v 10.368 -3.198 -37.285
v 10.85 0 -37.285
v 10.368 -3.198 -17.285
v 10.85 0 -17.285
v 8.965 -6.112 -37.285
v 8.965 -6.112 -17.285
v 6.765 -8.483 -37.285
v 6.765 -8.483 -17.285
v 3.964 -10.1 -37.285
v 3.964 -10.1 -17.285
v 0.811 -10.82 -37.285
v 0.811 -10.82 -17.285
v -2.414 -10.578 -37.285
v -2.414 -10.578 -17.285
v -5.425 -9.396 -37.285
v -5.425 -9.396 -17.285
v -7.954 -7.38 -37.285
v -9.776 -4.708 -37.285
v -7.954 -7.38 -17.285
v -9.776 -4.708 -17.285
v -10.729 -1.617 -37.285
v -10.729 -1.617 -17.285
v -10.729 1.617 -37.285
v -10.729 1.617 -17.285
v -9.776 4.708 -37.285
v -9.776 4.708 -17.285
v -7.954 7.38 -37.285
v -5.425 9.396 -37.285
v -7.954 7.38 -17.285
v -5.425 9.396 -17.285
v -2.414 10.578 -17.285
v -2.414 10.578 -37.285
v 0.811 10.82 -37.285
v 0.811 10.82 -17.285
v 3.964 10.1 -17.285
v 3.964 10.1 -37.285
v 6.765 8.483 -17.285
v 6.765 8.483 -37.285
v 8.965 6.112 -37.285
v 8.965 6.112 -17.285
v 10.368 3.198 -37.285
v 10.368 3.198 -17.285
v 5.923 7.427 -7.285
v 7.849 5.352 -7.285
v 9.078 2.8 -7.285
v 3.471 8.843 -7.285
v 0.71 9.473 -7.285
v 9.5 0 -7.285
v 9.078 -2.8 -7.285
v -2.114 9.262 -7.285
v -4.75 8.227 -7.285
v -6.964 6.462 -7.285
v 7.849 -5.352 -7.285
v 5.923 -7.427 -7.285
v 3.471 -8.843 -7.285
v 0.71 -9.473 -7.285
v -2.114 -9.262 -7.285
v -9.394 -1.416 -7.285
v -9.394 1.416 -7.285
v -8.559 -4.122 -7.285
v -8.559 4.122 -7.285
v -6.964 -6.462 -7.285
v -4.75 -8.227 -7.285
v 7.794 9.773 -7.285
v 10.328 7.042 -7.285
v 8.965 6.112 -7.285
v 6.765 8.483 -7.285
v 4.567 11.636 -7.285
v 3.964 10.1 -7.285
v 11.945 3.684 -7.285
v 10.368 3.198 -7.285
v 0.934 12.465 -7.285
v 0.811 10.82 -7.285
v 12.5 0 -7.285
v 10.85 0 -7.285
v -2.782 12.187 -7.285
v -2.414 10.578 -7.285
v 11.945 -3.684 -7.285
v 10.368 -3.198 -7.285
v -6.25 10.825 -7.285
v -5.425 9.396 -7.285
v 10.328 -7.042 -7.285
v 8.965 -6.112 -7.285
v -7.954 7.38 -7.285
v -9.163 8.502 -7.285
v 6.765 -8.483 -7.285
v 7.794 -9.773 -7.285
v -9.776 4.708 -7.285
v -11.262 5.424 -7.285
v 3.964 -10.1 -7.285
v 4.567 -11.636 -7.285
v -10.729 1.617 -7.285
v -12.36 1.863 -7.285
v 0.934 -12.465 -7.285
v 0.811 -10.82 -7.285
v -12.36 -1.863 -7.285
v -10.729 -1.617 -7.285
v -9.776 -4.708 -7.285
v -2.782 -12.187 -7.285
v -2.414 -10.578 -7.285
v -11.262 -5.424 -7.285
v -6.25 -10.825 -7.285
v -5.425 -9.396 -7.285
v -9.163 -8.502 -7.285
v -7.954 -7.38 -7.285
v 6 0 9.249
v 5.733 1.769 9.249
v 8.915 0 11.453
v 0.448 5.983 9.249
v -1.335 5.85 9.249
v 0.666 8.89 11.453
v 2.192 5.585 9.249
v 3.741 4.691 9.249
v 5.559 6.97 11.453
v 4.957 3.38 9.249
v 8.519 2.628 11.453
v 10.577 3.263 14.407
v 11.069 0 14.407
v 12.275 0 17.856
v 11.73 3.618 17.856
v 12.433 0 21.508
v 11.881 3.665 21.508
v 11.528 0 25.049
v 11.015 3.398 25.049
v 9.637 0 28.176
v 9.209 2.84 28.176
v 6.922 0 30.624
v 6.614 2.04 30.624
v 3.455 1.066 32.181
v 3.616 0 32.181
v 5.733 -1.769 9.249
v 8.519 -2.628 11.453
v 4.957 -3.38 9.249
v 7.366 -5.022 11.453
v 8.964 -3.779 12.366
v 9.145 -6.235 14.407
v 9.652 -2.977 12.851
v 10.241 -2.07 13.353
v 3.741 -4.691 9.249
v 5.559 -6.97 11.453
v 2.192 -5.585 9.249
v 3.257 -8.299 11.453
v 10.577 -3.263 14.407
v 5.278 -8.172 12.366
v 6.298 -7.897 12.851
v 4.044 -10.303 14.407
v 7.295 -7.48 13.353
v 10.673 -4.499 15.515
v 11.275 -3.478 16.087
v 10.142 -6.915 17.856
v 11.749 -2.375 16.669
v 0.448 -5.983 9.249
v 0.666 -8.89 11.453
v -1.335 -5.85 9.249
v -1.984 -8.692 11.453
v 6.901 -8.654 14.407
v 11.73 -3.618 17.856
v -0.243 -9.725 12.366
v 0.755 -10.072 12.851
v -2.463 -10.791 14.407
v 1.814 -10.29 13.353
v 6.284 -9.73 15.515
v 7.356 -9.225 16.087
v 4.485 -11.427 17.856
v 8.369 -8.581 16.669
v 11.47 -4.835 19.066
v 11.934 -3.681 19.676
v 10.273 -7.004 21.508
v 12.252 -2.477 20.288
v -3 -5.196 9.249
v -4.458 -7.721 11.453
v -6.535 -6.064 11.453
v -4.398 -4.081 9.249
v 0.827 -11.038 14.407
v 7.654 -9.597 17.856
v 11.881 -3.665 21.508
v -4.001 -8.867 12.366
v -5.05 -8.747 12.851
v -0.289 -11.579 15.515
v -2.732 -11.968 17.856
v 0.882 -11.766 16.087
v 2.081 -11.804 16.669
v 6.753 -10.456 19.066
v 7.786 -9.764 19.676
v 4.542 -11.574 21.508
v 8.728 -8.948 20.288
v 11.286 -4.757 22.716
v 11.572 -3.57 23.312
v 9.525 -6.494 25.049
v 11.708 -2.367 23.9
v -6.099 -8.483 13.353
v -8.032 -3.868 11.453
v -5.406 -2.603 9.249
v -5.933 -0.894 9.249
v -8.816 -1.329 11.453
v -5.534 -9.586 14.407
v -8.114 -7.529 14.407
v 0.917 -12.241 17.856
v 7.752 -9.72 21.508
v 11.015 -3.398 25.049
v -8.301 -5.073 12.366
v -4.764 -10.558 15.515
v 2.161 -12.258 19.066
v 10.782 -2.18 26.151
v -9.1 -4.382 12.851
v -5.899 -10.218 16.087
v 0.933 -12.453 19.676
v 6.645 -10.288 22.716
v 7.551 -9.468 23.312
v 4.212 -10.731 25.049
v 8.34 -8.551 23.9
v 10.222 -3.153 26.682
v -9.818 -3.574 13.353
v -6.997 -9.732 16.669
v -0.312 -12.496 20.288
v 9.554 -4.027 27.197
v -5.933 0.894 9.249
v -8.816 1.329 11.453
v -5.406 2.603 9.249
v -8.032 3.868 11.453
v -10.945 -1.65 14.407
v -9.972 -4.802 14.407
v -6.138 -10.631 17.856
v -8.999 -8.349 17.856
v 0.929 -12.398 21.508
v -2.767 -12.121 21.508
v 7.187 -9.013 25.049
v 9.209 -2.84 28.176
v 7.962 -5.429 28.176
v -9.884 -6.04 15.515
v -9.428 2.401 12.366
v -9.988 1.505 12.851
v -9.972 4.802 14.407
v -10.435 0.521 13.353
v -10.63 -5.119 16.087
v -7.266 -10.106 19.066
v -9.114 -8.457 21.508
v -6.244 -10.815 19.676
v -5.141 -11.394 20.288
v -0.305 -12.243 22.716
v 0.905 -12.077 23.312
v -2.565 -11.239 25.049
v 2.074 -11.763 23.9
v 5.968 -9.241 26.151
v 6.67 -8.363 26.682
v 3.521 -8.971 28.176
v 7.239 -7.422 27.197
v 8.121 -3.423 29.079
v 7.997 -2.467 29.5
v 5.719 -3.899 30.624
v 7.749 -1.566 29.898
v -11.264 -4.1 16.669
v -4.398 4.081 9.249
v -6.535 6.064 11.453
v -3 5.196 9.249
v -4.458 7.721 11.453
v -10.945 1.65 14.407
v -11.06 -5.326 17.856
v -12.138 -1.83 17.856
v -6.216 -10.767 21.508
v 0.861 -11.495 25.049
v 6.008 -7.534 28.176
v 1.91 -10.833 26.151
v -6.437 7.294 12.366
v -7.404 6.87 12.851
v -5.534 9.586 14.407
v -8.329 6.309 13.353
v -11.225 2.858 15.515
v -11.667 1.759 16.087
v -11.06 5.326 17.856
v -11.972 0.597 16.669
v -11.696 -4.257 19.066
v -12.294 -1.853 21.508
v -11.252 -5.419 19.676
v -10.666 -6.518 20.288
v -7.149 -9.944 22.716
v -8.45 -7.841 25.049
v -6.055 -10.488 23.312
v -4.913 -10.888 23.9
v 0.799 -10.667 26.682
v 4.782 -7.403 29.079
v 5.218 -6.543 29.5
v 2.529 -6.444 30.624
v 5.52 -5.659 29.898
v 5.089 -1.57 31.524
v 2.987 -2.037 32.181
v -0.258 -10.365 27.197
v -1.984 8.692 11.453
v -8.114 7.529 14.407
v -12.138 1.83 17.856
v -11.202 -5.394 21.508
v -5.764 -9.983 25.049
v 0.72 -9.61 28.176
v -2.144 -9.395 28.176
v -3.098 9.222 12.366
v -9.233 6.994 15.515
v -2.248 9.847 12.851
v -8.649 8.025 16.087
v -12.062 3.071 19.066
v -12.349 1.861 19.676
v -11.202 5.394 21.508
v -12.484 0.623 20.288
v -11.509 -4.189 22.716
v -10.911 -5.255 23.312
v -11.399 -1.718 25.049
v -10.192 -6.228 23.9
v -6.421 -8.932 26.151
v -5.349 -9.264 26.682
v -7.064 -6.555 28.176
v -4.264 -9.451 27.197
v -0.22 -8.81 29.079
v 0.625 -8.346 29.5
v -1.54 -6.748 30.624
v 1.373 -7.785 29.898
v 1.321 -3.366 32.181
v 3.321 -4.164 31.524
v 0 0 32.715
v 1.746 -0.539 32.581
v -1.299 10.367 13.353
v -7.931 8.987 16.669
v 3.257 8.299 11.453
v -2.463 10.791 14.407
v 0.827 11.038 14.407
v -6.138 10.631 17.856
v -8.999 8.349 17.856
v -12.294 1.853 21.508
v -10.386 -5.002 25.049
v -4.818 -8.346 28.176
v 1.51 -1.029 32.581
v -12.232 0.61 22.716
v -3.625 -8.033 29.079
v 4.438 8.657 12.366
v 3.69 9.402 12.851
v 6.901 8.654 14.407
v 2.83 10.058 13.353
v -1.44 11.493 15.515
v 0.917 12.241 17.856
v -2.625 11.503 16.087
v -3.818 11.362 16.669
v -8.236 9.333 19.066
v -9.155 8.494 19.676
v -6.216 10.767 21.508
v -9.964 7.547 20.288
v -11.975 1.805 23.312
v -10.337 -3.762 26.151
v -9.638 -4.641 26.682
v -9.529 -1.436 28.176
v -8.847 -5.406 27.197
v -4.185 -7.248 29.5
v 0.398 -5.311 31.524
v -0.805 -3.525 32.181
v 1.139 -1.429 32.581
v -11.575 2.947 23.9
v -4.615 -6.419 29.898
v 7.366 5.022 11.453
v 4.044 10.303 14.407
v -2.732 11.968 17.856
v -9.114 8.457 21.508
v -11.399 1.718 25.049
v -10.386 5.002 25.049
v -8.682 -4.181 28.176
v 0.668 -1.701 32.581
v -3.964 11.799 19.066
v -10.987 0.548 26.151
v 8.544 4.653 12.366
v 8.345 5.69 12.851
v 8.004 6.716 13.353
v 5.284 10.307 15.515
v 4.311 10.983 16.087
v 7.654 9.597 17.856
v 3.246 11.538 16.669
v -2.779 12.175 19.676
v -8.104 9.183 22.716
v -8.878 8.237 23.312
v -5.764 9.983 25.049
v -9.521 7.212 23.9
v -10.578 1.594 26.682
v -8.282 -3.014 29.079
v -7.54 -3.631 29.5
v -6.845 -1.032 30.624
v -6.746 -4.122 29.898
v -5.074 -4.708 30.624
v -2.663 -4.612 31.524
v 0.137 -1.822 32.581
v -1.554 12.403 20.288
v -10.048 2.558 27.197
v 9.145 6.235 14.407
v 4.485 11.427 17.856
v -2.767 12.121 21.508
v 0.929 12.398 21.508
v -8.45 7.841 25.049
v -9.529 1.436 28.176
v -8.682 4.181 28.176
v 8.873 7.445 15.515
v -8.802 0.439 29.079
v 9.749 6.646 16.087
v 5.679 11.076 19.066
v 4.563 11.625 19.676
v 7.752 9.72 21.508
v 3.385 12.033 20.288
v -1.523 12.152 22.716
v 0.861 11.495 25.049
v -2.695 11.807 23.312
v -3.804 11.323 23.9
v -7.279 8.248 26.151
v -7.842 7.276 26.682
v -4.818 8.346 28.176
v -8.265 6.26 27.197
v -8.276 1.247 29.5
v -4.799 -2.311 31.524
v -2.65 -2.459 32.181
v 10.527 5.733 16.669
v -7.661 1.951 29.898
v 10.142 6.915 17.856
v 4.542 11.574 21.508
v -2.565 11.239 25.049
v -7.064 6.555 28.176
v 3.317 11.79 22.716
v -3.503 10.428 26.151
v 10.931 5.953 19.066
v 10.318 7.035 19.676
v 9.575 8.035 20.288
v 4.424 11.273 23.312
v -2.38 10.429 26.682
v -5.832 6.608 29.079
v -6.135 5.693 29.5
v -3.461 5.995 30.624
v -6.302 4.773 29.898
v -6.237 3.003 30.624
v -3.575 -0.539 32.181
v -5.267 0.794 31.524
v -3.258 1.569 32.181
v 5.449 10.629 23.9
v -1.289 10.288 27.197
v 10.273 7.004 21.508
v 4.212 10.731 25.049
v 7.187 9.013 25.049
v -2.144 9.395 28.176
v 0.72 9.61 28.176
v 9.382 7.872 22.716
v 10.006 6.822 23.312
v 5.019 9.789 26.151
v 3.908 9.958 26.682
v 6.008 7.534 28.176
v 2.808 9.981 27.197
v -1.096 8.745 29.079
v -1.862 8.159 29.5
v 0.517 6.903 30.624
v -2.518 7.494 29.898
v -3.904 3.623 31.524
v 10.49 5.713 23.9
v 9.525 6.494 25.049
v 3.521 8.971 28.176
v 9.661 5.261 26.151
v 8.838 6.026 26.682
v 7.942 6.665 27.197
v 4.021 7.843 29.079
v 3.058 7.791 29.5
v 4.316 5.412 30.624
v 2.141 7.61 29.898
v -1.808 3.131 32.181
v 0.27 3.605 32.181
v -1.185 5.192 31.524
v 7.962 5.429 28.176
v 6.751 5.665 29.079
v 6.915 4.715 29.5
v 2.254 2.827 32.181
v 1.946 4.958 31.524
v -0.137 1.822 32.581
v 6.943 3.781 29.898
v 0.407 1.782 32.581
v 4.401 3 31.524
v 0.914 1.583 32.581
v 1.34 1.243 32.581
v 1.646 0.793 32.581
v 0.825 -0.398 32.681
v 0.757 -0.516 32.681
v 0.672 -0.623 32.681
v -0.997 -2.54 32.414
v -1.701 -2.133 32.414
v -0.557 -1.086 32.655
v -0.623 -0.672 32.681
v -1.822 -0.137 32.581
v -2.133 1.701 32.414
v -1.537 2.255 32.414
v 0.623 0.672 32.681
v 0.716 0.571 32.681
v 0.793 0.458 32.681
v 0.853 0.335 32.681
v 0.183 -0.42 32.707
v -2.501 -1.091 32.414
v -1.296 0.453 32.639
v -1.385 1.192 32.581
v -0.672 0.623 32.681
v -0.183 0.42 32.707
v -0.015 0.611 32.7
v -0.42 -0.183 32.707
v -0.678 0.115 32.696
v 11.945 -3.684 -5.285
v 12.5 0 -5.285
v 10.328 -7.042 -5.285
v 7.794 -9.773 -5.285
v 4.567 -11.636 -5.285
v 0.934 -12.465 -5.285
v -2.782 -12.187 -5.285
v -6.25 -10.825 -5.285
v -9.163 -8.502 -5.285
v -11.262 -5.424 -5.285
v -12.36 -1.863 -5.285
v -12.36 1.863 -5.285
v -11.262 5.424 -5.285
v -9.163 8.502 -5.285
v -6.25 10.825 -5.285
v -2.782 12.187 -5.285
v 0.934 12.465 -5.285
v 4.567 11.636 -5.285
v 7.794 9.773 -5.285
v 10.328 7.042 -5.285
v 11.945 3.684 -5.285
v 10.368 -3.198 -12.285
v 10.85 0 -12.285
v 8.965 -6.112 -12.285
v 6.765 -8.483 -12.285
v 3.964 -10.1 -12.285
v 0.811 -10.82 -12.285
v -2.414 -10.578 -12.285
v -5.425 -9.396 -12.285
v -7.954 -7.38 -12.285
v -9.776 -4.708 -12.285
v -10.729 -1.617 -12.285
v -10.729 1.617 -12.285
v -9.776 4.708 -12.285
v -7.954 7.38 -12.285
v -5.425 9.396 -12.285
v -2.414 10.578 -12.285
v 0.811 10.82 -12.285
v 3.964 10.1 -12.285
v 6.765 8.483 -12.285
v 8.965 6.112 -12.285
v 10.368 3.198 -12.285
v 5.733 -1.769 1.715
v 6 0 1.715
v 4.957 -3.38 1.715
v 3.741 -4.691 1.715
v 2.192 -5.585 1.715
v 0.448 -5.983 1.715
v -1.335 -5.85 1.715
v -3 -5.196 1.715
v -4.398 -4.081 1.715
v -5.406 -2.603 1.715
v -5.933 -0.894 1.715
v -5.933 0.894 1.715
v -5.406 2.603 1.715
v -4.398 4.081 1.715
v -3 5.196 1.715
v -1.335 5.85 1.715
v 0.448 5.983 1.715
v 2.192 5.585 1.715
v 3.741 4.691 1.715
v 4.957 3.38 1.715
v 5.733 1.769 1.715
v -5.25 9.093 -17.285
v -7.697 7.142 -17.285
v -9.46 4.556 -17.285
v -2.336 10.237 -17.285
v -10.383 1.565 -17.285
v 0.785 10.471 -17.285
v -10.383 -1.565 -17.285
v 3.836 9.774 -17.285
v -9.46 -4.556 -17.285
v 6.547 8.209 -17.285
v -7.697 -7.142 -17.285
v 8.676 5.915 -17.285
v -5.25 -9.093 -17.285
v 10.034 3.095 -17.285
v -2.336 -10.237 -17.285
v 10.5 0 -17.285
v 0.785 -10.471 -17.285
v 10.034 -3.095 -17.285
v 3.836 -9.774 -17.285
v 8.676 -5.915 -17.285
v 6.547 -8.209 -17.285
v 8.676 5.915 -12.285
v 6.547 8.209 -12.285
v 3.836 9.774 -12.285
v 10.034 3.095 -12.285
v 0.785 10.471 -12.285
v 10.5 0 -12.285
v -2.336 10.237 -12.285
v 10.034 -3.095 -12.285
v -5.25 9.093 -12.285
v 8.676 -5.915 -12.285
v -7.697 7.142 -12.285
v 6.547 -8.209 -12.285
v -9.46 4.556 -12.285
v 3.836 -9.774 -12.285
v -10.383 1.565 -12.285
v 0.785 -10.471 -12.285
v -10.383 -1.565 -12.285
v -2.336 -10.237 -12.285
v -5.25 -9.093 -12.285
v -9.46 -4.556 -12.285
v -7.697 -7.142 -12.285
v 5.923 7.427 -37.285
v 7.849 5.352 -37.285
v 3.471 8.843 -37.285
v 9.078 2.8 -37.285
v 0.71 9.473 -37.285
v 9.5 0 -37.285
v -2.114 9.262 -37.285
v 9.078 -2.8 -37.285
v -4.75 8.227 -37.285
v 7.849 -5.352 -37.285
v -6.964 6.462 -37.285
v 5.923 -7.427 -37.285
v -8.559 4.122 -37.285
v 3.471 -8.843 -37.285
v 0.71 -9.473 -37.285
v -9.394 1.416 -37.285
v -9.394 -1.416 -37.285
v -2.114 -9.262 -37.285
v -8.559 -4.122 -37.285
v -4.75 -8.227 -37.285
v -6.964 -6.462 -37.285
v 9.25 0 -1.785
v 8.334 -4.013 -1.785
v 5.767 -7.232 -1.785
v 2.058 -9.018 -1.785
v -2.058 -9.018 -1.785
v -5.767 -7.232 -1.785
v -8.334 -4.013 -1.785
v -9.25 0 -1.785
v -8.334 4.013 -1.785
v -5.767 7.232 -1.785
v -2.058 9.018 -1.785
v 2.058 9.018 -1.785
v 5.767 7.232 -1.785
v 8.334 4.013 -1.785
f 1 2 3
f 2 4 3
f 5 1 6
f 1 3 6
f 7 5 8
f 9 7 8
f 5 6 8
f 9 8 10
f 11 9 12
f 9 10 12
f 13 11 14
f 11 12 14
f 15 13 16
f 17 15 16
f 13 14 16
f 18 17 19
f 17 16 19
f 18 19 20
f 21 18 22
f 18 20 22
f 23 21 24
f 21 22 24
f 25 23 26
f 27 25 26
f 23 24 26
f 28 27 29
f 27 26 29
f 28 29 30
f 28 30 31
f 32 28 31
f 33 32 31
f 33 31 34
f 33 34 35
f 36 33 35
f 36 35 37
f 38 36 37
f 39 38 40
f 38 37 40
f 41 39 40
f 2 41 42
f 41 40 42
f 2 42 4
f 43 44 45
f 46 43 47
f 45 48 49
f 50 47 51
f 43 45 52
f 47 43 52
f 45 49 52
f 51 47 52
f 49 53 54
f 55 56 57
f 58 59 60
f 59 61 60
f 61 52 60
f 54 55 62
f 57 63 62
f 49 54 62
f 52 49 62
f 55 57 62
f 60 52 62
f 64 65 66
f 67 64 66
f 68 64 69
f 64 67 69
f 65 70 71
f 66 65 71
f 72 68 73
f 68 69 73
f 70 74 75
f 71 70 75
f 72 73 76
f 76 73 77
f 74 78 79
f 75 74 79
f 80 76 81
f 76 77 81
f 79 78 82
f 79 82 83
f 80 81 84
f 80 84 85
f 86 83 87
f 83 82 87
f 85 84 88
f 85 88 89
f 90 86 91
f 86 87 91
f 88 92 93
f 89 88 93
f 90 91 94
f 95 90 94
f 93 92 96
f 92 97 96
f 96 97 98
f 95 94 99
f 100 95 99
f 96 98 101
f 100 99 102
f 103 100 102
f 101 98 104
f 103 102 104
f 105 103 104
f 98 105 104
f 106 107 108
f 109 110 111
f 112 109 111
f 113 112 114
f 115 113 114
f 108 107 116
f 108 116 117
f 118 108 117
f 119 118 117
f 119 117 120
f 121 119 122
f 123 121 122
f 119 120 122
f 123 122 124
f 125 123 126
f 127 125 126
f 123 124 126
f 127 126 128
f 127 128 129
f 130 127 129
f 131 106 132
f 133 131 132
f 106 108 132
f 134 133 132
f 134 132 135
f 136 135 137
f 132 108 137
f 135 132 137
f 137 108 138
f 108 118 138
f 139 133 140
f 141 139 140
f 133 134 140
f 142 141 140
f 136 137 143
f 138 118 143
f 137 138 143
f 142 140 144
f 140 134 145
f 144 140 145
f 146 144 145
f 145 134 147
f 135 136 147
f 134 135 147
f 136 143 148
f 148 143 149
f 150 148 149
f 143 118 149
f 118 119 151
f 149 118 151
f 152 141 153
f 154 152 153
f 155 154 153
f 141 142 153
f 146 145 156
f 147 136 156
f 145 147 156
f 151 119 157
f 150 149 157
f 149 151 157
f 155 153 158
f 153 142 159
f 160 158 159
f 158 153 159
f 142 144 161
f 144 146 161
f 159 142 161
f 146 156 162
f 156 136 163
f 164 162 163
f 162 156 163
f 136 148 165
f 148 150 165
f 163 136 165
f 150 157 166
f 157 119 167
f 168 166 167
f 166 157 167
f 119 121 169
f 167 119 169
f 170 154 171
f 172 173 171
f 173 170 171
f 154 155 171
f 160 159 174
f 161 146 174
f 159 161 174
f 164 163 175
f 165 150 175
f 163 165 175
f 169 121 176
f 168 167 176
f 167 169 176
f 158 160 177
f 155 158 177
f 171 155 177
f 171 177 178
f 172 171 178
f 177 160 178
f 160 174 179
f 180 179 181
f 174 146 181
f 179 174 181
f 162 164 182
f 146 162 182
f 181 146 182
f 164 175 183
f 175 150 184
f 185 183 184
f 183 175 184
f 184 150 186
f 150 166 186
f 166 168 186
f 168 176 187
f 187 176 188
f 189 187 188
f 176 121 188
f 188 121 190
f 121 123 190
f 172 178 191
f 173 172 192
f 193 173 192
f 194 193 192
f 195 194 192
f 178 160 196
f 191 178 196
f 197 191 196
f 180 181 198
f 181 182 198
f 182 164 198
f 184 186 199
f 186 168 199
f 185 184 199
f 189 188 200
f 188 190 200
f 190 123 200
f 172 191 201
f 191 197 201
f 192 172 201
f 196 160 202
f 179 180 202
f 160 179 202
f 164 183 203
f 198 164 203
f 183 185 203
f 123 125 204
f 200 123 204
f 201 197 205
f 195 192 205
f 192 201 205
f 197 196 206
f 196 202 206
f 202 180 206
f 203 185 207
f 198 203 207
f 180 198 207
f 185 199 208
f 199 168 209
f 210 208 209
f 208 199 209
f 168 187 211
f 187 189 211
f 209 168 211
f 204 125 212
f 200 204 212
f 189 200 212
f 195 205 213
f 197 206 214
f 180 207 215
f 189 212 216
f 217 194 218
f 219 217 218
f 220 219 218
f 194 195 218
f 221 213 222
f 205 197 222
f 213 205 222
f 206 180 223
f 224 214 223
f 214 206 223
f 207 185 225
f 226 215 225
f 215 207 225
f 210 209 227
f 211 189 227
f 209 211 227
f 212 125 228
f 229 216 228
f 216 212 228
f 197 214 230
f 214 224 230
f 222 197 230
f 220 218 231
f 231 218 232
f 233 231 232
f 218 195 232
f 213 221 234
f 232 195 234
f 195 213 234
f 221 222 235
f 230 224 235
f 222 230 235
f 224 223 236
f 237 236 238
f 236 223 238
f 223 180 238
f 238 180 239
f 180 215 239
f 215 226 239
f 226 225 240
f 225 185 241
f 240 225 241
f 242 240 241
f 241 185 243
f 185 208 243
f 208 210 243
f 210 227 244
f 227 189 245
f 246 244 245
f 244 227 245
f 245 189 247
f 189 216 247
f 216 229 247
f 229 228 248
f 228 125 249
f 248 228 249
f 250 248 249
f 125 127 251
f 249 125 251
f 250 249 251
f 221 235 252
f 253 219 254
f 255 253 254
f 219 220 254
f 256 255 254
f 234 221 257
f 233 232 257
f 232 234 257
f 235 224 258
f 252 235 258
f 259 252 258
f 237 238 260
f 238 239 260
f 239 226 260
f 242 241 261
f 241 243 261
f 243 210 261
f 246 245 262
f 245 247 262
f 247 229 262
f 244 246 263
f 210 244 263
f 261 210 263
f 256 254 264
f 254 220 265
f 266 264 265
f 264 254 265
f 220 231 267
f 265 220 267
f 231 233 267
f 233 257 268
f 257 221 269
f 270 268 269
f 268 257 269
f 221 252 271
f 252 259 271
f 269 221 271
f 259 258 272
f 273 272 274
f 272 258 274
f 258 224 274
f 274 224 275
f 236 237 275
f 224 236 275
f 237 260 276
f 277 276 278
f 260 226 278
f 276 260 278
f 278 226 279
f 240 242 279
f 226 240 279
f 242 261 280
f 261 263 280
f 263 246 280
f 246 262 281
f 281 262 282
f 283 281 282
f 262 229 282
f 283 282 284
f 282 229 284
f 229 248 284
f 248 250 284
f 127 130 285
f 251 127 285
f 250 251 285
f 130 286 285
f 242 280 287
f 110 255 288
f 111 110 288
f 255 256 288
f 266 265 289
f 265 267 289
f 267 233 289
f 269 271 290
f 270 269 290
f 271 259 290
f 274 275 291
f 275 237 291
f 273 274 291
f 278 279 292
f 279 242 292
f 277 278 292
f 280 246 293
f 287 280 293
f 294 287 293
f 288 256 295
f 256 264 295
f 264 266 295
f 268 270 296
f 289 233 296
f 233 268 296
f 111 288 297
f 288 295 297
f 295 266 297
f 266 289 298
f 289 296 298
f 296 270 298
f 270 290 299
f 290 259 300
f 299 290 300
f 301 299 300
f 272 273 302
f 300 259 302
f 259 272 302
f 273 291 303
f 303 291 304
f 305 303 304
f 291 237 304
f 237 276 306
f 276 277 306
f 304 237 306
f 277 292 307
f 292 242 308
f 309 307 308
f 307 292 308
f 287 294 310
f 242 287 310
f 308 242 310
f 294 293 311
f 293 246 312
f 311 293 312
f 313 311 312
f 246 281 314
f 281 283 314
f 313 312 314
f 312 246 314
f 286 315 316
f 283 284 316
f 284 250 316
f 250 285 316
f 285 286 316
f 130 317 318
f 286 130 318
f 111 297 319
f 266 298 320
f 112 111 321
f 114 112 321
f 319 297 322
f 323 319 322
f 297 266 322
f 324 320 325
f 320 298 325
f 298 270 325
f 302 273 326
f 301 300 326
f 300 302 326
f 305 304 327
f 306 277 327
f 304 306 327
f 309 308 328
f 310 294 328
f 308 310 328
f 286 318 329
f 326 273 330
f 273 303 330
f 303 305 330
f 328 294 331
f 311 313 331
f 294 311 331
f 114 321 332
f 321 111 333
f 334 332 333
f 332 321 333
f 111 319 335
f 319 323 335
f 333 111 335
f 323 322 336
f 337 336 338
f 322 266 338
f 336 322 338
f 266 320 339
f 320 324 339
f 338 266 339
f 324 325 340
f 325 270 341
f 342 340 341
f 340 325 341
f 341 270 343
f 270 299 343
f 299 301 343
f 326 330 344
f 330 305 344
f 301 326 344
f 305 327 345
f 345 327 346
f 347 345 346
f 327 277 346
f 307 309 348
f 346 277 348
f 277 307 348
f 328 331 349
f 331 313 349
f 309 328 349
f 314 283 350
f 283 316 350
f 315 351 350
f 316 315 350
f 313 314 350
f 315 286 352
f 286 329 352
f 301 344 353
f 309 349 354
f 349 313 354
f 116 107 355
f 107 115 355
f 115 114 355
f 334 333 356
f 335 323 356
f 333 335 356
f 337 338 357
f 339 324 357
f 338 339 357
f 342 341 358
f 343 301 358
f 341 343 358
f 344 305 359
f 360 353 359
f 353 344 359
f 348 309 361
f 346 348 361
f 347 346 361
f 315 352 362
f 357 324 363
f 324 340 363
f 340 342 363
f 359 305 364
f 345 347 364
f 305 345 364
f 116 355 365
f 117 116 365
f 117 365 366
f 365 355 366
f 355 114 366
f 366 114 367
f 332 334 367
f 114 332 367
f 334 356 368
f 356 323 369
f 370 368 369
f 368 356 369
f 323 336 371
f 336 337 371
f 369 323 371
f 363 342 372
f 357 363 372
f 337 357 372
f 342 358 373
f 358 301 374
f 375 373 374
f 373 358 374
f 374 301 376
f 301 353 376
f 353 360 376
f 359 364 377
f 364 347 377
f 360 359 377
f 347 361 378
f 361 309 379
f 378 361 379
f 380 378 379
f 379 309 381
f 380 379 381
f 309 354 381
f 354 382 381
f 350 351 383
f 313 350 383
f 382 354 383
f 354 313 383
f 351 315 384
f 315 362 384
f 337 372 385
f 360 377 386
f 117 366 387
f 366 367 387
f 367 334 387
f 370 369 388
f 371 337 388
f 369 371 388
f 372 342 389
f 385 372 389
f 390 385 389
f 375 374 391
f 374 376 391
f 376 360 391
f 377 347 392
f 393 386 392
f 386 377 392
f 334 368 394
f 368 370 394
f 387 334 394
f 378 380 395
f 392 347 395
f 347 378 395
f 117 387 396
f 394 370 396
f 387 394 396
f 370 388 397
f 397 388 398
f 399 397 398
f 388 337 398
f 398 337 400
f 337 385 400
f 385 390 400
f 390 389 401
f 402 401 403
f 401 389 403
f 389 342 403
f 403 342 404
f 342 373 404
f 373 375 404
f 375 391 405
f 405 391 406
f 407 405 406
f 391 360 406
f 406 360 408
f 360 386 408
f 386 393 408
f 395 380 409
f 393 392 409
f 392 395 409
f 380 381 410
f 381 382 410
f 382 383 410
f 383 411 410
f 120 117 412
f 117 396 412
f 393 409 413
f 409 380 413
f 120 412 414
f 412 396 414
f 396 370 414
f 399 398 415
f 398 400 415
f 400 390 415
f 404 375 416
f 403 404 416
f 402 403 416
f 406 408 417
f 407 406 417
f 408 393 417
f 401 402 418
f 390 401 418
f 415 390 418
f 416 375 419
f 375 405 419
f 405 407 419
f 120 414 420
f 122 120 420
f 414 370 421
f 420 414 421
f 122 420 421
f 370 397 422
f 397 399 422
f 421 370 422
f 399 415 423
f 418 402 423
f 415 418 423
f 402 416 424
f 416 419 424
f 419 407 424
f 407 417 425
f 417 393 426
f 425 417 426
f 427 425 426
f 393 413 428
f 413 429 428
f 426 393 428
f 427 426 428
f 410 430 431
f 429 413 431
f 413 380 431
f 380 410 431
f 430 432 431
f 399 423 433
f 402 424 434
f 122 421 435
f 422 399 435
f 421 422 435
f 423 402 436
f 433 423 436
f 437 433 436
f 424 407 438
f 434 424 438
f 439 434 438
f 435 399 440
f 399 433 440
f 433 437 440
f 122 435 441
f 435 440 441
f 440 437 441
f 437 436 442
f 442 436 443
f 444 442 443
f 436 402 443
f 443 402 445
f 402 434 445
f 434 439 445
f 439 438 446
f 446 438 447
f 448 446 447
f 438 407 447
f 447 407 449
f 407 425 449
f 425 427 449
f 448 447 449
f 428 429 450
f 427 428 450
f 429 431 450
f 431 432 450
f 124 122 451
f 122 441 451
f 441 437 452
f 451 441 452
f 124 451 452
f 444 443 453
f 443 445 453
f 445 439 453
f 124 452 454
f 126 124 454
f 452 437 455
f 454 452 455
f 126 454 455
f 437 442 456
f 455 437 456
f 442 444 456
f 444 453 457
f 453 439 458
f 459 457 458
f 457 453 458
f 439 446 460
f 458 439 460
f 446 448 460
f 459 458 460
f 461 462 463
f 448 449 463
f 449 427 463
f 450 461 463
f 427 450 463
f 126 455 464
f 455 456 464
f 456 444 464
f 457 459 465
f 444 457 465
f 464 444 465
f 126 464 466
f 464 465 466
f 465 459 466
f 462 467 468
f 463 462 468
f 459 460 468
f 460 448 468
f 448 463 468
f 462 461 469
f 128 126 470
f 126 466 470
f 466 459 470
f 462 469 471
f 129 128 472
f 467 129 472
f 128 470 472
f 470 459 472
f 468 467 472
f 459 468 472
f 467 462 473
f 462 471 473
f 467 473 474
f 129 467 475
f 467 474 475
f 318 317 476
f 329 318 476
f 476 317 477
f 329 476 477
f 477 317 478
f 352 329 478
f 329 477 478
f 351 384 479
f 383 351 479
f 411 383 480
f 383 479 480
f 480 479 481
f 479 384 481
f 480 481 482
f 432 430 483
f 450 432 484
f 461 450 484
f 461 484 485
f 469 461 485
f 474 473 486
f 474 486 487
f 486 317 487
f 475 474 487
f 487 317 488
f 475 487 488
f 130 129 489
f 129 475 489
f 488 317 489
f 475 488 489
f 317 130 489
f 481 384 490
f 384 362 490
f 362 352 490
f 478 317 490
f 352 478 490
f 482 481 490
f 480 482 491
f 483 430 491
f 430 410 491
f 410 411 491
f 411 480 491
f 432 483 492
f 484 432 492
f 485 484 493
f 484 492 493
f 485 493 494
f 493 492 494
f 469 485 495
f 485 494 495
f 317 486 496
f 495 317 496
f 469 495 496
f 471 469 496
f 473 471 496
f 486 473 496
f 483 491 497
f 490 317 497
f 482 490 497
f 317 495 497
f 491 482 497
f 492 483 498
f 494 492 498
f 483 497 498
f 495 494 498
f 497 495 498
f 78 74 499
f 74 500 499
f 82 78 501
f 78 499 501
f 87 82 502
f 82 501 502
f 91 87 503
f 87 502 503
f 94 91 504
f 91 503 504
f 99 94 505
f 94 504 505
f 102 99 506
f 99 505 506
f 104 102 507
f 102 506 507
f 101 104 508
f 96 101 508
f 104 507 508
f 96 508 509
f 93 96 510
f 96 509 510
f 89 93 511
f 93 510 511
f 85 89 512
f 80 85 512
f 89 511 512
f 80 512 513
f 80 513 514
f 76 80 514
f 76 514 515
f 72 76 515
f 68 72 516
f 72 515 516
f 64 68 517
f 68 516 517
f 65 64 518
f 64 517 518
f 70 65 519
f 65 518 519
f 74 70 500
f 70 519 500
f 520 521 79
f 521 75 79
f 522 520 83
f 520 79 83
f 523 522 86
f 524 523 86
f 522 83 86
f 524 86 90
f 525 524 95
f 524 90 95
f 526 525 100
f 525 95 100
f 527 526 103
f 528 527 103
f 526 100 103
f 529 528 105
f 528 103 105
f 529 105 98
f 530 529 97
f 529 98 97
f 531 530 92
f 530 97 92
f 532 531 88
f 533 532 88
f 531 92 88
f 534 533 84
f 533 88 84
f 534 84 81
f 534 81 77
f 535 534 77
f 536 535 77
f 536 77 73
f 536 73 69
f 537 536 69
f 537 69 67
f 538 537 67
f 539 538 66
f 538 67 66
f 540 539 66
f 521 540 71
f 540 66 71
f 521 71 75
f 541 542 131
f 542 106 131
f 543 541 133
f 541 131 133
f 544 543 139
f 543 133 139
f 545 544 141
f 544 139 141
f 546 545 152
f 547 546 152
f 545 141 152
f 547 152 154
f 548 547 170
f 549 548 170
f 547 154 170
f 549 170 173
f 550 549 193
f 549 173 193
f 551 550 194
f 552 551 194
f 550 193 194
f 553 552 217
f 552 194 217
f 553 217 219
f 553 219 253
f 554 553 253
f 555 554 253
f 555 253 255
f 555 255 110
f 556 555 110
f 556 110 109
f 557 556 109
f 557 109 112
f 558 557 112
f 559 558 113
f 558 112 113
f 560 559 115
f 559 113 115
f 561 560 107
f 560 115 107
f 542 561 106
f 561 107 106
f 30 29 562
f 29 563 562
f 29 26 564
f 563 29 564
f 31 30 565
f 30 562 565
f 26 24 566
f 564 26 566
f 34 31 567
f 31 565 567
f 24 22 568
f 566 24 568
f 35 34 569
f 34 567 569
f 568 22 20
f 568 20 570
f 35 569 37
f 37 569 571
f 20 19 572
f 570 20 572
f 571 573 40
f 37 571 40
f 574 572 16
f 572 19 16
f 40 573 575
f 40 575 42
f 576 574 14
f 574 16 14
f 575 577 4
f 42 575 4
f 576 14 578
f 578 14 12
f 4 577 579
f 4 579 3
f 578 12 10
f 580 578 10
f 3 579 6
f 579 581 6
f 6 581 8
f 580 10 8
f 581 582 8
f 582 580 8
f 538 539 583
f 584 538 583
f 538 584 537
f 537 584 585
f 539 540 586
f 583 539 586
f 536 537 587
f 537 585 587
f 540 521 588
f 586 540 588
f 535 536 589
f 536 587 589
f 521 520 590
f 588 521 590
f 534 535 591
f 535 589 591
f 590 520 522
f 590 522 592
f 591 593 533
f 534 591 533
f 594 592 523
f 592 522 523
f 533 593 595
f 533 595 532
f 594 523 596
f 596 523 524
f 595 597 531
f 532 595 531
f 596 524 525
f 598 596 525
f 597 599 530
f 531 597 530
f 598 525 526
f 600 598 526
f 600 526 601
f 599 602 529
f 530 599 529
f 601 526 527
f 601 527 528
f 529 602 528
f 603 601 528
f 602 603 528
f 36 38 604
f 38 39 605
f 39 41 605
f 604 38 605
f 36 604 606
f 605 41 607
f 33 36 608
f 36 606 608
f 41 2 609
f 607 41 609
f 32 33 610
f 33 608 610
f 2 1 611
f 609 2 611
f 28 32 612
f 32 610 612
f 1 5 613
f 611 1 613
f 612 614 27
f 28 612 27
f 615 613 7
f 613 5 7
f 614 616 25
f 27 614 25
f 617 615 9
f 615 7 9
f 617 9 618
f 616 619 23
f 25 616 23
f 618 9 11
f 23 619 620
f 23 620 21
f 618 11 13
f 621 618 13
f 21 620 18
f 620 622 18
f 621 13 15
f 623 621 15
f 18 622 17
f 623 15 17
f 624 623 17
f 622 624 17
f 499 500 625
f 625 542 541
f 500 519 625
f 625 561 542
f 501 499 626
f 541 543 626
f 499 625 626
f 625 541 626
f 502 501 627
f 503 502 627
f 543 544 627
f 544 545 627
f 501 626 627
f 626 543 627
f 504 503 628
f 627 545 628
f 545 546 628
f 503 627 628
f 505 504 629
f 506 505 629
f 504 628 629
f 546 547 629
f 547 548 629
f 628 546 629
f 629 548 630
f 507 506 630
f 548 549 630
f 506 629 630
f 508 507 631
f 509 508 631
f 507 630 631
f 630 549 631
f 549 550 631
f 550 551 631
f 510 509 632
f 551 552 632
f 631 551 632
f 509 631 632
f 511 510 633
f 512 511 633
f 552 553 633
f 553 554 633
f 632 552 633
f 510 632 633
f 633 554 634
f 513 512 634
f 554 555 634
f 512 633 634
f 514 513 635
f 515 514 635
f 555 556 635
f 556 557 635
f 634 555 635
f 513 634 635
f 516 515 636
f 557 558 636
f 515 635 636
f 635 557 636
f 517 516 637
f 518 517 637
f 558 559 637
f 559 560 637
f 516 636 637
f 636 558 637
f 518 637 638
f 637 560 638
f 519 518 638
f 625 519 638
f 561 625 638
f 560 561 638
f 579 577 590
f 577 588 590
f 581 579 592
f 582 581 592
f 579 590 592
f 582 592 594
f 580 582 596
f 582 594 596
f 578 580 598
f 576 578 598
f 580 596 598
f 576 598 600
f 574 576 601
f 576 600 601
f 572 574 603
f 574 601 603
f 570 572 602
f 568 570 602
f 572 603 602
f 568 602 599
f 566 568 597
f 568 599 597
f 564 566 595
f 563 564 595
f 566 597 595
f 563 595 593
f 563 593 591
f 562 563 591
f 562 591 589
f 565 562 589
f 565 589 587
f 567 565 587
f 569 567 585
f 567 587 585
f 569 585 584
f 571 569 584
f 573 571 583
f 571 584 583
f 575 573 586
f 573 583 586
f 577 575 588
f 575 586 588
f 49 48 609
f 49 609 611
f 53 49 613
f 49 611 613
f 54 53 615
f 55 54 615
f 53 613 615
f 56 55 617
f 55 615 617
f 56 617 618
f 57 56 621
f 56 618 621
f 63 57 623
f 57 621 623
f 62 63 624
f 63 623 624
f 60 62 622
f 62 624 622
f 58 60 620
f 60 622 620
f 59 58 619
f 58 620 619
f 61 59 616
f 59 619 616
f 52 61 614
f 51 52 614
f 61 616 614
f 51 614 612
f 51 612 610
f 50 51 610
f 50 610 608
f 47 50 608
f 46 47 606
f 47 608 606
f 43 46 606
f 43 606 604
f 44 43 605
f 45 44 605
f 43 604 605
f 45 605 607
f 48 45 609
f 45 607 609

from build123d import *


with BuildPart() as f1:
    # F0 (on Front) → F1 (revolve)
    with BuildSketch(Plane.XZ):
        with BuildLine():
            ThreePointArc((6, 9.24921), (12.110392, 23.31158), (0, 32.715066))
            Line((0, 32.715066), (0, -7.284934))
            Line((0, -7.284934), (9.5, -7.284934))
            Line((9.5, -7.284934), (9.5, -37.284934))
            Line((9.5, -37.284934), (10.85, -37.284934))
            Line((10.85, -37.284934), (10.85, -17.284934))
            Line((10.85, -17.284934), (10.5, -17.284934))
            Line((10.5, -17.284934), (10.5, -12.284934))
            Line((10.5, -12.284934), (10.85, -12.284934))
            Line((10.85, -12.284934), (10.85, -7.284934))
            Line((10.85, -7.284934), (12.5, -7.284934))
            Line((12.5, -7.284934), (12.5, -5.284934))
            Line((12.5, -5.284934), (6, 1.715066))
            Line((6, 1.715066), (6, 9.24921))
        make_face()
    revolve(axis=Axis((0, 0, 12.715066), (0, 0, -1)))


solid = f1.part
